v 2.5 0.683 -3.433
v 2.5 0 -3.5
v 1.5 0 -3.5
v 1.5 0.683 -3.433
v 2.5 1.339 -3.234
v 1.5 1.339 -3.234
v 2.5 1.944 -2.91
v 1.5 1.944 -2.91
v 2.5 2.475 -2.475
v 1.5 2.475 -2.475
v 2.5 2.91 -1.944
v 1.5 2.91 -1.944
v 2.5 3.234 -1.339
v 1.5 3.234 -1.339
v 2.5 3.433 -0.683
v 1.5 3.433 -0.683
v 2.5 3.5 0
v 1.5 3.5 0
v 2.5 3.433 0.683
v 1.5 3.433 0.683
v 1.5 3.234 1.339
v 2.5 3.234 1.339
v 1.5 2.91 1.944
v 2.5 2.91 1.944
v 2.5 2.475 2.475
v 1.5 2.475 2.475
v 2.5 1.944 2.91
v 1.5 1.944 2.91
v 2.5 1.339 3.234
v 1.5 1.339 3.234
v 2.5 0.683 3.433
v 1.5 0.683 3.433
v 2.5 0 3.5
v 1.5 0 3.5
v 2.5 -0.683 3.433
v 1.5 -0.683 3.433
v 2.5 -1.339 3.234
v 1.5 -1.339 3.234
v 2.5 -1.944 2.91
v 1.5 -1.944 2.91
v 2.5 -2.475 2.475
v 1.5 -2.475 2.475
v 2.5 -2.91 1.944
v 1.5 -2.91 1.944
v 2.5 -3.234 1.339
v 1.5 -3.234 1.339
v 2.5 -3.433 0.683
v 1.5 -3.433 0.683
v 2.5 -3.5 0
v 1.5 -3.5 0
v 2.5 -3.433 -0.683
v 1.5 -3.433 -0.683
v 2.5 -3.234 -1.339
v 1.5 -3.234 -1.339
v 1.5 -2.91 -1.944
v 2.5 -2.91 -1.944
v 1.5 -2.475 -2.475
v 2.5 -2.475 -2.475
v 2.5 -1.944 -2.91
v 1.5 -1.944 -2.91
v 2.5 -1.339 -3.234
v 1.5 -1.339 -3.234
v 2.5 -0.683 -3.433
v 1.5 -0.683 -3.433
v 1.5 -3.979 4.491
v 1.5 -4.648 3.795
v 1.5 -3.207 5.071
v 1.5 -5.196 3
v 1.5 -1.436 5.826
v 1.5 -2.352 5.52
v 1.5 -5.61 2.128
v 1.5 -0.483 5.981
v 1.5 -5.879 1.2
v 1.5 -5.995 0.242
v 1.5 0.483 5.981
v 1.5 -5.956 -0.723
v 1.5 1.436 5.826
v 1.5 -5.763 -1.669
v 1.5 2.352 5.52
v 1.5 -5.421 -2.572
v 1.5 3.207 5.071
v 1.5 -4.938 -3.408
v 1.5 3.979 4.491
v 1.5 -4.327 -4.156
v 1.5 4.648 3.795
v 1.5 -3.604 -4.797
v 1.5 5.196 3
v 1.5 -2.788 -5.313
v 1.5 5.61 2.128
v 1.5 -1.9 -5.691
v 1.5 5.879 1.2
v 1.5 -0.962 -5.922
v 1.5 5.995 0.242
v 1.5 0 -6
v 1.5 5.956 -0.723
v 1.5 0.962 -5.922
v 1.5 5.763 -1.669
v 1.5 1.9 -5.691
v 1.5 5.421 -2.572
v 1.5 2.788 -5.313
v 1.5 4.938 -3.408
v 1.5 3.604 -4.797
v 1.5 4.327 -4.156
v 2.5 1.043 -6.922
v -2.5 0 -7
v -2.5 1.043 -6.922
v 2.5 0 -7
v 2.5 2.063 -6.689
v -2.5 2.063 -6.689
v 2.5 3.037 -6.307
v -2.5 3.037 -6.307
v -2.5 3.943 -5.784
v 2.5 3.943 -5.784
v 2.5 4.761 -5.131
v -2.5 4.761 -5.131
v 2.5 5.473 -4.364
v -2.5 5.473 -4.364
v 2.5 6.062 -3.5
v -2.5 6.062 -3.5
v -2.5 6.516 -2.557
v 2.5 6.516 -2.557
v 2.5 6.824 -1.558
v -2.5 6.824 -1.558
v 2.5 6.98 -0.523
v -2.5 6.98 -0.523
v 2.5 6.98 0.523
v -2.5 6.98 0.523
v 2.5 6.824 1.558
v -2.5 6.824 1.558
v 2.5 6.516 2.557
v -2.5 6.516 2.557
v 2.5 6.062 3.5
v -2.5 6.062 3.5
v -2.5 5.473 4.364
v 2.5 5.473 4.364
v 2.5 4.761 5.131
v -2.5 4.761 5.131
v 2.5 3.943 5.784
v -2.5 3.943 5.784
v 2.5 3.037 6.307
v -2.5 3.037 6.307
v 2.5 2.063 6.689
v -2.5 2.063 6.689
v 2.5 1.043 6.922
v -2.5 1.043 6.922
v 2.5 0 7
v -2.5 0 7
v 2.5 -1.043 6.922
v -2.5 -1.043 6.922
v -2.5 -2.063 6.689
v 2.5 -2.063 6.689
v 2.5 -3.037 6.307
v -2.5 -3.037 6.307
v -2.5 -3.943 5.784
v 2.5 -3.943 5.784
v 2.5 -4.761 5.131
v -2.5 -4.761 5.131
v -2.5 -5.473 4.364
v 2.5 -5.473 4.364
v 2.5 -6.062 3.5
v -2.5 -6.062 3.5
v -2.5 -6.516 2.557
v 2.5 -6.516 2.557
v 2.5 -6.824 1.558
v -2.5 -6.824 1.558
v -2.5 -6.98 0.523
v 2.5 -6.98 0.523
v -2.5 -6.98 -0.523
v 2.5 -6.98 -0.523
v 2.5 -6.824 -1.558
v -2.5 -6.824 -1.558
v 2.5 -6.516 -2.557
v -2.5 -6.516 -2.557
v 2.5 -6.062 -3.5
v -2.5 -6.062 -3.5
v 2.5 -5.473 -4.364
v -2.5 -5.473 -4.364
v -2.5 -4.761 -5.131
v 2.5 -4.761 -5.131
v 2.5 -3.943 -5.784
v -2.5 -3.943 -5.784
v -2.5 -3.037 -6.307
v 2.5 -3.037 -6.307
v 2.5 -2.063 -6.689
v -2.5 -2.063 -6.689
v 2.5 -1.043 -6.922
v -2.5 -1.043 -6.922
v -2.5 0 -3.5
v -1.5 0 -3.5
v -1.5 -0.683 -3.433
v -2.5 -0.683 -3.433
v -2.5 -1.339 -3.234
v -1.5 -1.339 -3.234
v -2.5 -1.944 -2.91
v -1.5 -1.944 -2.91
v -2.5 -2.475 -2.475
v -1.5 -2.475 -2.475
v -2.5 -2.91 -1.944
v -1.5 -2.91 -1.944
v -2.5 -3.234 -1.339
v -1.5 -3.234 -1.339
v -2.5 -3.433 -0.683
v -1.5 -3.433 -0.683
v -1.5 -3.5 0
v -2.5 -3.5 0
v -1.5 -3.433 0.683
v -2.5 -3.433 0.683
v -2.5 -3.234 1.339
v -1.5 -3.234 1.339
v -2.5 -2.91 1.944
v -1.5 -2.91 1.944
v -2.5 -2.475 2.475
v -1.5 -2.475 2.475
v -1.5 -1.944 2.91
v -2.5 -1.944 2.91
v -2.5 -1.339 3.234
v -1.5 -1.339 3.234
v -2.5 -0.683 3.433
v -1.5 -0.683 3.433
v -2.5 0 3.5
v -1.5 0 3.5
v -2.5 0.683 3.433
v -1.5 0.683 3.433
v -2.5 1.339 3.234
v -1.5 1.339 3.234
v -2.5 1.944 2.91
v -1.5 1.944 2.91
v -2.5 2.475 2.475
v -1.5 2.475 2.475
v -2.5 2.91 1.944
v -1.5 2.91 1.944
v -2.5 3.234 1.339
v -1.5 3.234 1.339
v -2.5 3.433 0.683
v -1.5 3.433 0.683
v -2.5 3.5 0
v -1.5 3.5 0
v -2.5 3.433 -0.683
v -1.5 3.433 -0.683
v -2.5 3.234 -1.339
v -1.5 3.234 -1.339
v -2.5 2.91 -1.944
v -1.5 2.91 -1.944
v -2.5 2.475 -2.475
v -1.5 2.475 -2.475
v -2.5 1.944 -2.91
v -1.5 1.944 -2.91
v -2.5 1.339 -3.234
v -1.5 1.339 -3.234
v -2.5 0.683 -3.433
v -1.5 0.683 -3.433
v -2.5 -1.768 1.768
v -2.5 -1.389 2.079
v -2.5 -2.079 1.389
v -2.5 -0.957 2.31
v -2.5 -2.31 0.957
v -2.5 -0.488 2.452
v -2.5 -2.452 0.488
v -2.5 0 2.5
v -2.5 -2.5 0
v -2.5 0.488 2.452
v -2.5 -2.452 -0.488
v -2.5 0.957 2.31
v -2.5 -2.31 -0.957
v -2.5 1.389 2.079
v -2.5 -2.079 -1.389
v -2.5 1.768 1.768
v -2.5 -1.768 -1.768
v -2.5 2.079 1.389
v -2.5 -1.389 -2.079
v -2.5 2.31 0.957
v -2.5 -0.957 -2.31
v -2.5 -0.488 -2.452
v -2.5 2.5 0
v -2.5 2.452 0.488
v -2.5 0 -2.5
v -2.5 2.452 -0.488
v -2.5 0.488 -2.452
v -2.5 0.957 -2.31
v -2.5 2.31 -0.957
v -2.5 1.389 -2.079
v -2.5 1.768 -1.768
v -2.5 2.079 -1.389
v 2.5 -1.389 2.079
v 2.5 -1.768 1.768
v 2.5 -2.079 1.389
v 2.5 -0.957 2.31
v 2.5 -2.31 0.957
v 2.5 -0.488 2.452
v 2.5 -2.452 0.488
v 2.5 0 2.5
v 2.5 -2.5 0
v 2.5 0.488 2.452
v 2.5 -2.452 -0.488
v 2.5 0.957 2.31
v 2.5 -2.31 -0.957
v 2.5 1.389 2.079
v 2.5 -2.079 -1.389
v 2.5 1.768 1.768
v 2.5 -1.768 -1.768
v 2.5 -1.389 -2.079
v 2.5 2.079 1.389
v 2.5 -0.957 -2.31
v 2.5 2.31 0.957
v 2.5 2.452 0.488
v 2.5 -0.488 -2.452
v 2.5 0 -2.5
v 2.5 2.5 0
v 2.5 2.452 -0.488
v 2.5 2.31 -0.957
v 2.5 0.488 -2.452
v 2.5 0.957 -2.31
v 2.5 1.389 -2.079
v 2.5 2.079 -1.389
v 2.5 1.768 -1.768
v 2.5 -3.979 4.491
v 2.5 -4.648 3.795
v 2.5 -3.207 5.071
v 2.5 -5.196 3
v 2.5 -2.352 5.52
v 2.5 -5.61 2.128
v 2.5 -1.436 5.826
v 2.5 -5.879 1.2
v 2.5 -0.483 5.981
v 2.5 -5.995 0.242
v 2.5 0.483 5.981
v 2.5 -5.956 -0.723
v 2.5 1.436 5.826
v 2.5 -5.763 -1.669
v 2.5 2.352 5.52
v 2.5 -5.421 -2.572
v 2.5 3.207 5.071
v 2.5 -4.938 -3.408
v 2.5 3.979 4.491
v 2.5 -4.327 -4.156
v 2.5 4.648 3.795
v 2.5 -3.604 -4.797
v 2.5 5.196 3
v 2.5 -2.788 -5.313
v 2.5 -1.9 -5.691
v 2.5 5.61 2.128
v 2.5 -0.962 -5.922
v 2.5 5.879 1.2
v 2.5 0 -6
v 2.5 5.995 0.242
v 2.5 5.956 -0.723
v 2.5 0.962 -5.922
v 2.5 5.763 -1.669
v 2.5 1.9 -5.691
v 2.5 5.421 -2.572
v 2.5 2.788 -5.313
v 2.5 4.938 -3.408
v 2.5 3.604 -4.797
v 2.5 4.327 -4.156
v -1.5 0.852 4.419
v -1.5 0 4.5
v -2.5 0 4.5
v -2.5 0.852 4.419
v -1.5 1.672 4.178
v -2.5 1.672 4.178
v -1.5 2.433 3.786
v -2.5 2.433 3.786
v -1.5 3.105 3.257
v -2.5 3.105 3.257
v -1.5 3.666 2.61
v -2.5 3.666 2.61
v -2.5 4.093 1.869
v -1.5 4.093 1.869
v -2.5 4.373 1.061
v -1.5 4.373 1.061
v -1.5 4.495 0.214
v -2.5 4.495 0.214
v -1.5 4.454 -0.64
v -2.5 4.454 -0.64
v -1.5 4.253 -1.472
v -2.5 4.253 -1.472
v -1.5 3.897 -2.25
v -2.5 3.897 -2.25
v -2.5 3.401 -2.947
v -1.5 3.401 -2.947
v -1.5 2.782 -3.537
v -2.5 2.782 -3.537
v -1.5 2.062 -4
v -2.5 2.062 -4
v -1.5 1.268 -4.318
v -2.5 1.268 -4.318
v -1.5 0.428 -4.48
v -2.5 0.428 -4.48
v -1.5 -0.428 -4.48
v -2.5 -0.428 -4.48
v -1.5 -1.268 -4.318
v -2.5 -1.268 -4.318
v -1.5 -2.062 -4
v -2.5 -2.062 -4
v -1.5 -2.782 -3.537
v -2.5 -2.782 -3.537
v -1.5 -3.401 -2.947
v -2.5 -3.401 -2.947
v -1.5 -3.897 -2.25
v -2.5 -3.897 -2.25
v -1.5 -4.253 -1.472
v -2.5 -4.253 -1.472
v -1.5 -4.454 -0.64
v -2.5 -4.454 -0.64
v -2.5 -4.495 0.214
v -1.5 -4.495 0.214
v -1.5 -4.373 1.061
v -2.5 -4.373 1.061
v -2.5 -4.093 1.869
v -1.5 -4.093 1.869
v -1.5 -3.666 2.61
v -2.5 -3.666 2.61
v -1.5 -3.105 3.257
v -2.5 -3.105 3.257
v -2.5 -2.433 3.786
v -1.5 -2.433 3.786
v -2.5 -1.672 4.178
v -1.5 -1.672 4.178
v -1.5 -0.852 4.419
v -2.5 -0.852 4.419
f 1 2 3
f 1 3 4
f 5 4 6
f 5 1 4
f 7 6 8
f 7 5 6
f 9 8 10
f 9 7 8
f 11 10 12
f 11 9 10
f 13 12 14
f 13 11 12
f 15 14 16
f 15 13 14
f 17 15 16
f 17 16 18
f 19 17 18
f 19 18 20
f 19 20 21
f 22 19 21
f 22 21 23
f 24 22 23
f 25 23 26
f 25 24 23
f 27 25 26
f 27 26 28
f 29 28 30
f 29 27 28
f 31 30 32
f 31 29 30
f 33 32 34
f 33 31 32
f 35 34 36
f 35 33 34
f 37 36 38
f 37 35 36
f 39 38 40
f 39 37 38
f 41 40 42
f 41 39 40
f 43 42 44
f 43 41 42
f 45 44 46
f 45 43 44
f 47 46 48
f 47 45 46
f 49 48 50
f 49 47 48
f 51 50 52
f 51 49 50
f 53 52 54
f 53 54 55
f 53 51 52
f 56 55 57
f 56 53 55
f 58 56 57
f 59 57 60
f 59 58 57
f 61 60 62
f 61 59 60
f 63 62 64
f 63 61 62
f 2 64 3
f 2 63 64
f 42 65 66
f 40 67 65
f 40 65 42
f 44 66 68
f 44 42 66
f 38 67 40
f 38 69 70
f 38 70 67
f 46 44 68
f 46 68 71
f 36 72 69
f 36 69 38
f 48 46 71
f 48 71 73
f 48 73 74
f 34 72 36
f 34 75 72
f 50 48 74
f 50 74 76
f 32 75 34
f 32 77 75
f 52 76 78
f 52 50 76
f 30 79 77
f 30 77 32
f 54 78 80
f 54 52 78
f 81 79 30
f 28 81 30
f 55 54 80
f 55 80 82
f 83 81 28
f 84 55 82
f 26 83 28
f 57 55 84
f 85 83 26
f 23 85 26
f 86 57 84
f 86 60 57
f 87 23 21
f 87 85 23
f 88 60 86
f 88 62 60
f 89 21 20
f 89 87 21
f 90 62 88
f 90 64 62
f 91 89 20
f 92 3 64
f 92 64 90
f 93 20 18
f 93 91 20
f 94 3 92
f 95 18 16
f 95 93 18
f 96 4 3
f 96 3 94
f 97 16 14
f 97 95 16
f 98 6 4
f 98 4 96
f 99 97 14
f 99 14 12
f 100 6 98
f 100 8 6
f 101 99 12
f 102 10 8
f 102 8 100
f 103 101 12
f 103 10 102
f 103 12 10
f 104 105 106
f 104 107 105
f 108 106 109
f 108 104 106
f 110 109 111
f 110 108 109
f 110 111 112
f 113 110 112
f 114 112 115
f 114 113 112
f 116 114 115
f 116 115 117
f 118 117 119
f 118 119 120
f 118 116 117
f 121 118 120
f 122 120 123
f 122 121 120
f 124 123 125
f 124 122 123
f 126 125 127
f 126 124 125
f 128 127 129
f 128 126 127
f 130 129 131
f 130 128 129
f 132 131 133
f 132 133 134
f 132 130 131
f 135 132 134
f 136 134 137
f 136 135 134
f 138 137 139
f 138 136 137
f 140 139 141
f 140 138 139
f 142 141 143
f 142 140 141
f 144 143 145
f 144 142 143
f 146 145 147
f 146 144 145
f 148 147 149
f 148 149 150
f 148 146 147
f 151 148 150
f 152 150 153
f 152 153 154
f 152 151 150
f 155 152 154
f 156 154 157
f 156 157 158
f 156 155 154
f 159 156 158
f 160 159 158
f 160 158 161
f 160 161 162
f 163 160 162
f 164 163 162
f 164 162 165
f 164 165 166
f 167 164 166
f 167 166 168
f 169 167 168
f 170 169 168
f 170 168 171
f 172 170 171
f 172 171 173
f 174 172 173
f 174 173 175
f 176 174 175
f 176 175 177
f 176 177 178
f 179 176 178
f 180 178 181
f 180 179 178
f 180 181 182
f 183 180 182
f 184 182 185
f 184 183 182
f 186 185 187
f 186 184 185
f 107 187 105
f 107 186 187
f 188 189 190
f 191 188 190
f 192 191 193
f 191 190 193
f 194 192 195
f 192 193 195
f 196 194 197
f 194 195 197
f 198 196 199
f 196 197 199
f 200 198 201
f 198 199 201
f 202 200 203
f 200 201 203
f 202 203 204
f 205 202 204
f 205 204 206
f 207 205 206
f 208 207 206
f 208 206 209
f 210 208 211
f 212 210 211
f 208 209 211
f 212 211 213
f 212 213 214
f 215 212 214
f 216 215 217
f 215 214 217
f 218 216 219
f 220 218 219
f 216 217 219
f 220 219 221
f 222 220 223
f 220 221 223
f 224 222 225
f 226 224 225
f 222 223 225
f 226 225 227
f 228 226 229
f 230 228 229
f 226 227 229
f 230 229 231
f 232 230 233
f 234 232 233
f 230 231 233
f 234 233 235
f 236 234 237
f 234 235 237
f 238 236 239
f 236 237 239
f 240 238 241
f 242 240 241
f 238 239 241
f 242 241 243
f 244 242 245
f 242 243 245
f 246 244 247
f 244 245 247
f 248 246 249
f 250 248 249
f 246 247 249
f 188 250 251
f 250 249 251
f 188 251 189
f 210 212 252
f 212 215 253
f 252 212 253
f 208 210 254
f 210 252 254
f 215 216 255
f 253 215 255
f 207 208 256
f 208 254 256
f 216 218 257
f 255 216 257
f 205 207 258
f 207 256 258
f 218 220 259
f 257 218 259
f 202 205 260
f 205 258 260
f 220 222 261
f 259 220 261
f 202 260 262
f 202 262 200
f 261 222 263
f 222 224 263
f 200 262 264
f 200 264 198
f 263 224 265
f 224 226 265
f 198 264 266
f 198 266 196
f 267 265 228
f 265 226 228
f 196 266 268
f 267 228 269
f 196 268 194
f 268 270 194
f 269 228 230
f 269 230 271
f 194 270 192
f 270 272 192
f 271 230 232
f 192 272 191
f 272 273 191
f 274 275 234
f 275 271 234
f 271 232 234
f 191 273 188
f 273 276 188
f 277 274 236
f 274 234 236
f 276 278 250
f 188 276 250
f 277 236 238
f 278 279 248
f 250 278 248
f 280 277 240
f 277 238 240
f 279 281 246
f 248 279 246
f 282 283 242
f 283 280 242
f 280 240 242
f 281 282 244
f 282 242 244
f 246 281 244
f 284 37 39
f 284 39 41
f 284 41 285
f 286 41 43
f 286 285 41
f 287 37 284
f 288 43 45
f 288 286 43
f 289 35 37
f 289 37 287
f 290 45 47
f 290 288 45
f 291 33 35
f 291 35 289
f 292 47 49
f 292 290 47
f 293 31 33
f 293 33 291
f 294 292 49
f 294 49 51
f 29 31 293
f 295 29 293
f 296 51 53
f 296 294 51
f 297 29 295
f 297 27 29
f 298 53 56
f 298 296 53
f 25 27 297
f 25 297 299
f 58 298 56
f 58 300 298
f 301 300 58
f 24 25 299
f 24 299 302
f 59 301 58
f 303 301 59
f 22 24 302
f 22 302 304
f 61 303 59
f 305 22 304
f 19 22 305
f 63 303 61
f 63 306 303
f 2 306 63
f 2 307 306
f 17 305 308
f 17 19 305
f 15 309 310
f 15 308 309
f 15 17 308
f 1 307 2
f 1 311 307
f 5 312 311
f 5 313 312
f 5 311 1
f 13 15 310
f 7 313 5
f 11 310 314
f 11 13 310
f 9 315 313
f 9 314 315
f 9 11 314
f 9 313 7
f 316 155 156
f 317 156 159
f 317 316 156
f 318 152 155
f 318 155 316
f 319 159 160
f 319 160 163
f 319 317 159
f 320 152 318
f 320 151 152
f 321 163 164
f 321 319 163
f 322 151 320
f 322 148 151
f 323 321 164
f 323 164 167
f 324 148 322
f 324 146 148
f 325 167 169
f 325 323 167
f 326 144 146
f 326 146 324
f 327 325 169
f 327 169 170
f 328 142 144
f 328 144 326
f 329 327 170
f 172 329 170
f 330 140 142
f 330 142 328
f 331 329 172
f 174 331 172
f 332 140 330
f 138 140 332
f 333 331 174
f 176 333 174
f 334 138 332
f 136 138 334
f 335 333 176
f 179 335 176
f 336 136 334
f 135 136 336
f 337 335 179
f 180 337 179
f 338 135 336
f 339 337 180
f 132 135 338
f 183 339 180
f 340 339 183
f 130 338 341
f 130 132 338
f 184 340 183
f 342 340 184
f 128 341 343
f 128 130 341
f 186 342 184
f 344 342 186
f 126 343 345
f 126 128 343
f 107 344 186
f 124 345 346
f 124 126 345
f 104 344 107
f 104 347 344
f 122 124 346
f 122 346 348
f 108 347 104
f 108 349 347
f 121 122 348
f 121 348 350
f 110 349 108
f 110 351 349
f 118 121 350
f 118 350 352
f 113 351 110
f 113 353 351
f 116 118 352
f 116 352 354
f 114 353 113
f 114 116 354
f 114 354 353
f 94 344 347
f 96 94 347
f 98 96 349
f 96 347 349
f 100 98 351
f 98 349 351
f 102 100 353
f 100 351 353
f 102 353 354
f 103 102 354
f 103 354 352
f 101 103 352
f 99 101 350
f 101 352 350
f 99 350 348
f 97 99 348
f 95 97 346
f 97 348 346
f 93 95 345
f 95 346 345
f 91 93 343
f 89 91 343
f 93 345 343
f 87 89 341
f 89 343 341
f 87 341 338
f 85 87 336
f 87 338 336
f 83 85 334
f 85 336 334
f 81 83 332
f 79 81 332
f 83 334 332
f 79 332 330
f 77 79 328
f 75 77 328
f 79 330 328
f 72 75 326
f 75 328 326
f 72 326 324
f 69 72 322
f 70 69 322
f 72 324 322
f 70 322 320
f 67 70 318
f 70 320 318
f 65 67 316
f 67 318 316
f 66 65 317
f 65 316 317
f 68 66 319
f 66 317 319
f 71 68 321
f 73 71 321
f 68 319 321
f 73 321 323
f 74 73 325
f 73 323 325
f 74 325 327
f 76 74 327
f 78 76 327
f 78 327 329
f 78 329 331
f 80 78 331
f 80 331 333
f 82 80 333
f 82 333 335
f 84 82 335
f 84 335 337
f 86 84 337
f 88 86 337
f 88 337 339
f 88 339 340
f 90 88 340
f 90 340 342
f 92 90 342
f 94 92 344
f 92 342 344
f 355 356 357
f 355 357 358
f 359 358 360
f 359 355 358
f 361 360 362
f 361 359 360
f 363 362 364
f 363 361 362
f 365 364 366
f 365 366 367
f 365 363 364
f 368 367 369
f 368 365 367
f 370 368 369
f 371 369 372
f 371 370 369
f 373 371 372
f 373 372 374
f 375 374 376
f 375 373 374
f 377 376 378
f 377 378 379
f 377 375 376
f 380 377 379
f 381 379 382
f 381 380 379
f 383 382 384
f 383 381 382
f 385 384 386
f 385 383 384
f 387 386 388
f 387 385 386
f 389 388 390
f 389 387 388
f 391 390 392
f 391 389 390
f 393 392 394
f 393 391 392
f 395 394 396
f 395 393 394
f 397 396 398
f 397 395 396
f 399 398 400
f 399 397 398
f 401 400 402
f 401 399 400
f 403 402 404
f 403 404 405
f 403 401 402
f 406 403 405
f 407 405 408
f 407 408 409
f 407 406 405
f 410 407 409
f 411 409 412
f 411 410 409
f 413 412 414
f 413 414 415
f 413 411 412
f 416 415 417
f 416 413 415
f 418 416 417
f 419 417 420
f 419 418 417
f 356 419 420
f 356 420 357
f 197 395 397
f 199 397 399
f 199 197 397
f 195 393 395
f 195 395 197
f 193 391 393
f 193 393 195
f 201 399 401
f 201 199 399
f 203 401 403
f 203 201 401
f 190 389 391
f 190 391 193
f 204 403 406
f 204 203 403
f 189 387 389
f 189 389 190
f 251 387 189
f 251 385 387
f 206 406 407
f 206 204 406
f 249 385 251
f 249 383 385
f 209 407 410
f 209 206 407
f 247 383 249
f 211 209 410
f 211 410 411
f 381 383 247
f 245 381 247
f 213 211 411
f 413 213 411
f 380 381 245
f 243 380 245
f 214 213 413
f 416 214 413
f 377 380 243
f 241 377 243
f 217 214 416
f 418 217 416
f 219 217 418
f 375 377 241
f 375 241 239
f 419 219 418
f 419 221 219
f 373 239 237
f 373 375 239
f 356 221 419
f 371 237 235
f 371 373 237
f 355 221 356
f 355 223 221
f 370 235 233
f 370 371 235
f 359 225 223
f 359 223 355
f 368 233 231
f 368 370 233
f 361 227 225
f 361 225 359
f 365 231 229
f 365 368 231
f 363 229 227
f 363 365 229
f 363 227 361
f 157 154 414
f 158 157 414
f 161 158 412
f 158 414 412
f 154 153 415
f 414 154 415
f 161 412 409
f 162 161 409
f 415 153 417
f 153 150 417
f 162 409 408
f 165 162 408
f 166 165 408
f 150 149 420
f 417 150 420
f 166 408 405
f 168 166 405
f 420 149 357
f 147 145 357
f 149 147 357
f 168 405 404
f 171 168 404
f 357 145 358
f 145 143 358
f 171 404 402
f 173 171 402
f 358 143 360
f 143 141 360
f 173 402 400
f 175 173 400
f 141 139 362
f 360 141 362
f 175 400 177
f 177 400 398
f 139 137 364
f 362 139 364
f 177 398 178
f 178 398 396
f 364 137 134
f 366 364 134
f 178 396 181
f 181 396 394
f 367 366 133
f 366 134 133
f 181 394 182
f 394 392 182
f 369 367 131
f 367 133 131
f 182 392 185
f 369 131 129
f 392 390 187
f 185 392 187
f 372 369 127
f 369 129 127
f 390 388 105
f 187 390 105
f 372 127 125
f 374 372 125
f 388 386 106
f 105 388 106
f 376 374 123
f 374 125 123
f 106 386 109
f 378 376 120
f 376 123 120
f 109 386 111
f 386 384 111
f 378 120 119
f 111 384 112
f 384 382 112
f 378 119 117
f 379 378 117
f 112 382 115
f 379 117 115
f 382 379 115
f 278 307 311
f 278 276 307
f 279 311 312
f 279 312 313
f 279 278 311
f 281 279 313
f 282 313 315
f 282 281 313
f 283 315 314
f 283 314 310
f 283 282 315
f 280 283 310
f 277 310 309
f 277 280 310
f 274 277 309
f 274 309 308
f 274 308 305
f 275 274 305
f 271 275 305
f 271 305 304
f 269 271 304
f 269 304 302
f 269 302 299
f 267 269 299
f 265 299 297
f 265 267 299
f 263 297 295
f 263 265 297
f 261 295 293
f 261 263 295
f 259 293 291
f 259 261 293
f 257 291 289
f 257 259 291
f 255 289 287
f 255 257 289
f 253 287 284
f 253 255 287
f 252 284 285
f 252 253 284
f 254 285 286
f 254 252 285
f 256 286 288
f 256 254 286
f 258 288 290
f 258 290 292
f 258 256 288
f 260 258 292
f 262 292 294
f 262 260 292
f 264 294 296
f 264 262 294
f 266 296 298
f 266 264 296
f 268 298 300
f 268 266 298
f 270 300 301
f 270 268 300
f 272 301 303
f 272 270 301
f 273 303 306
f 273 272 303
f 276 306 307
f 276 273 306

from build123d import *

# Parameters (mm, degrees)
SKETCH_1_R          = 7
SKETCH_1_R_2        = 2.5
EXTRUDE_1_DEPTH     = 2.5
SKETCH_2_R          = 6
SKETCH_2_R_2        = 3.5
CUT_EXTRUDE_1_DEPTH = 1
CUT_EXTRUDE_START   = -1
SKETCH_3_R          = 4.5
SKETCH_3_R_2        = 3.5
CUT_EXTRUDE_2_DEPTH = 1


with BuildPart() as part:
    # 草图1 → 凸台-拉伸1 (new, symmetric)
    with BuildSketch(Plane.YZ):
        with Locations(Location((0, 0, 0), (0, 0, 270))):
            Circle(SKETCH_1_R)
        with Locations(Location((0, 0, 0), (0, 0, 270))):
            Circle(SKETCH_1_R_2, mode=Mode.SUBTRACT)
    extrude(amount=EXTRUDE_1_DEPTH, both=True)

    # 草图2 → 切除-拉伸1 (cut)
    with BuildSketch(Plane(origin=(2.5, 0, 0), x_dir=(0, 0, -1), z_dir=(1, 0, 0))):
        Circle(SKETCH_2_R)
        Circle(SKETCH_2_R_2, mode=Mode.SUBTRACT)
    extrude(amount=-CUT_EXTRUDE_1_DEPTH, mode=Mode.SUBTRACT)

    # 草图3 → 切除-拉伸2 (cut)
    with BuildSketch(Plane.ZY.offset(2.5).offset(CUT_EXTRUDE_START)):
        Circle(SKETCH_3_R)
        with Locations(Location((0, 0, 0), (0, 0, 180))):
            Circle(SKETCH_3_R_2, mode=Mode.SUBTRACT)
    extrude(amount=CUT_EXTRUDE_2_DEPTH, mode=Mode.SUBTRACT)


solid = part.part
